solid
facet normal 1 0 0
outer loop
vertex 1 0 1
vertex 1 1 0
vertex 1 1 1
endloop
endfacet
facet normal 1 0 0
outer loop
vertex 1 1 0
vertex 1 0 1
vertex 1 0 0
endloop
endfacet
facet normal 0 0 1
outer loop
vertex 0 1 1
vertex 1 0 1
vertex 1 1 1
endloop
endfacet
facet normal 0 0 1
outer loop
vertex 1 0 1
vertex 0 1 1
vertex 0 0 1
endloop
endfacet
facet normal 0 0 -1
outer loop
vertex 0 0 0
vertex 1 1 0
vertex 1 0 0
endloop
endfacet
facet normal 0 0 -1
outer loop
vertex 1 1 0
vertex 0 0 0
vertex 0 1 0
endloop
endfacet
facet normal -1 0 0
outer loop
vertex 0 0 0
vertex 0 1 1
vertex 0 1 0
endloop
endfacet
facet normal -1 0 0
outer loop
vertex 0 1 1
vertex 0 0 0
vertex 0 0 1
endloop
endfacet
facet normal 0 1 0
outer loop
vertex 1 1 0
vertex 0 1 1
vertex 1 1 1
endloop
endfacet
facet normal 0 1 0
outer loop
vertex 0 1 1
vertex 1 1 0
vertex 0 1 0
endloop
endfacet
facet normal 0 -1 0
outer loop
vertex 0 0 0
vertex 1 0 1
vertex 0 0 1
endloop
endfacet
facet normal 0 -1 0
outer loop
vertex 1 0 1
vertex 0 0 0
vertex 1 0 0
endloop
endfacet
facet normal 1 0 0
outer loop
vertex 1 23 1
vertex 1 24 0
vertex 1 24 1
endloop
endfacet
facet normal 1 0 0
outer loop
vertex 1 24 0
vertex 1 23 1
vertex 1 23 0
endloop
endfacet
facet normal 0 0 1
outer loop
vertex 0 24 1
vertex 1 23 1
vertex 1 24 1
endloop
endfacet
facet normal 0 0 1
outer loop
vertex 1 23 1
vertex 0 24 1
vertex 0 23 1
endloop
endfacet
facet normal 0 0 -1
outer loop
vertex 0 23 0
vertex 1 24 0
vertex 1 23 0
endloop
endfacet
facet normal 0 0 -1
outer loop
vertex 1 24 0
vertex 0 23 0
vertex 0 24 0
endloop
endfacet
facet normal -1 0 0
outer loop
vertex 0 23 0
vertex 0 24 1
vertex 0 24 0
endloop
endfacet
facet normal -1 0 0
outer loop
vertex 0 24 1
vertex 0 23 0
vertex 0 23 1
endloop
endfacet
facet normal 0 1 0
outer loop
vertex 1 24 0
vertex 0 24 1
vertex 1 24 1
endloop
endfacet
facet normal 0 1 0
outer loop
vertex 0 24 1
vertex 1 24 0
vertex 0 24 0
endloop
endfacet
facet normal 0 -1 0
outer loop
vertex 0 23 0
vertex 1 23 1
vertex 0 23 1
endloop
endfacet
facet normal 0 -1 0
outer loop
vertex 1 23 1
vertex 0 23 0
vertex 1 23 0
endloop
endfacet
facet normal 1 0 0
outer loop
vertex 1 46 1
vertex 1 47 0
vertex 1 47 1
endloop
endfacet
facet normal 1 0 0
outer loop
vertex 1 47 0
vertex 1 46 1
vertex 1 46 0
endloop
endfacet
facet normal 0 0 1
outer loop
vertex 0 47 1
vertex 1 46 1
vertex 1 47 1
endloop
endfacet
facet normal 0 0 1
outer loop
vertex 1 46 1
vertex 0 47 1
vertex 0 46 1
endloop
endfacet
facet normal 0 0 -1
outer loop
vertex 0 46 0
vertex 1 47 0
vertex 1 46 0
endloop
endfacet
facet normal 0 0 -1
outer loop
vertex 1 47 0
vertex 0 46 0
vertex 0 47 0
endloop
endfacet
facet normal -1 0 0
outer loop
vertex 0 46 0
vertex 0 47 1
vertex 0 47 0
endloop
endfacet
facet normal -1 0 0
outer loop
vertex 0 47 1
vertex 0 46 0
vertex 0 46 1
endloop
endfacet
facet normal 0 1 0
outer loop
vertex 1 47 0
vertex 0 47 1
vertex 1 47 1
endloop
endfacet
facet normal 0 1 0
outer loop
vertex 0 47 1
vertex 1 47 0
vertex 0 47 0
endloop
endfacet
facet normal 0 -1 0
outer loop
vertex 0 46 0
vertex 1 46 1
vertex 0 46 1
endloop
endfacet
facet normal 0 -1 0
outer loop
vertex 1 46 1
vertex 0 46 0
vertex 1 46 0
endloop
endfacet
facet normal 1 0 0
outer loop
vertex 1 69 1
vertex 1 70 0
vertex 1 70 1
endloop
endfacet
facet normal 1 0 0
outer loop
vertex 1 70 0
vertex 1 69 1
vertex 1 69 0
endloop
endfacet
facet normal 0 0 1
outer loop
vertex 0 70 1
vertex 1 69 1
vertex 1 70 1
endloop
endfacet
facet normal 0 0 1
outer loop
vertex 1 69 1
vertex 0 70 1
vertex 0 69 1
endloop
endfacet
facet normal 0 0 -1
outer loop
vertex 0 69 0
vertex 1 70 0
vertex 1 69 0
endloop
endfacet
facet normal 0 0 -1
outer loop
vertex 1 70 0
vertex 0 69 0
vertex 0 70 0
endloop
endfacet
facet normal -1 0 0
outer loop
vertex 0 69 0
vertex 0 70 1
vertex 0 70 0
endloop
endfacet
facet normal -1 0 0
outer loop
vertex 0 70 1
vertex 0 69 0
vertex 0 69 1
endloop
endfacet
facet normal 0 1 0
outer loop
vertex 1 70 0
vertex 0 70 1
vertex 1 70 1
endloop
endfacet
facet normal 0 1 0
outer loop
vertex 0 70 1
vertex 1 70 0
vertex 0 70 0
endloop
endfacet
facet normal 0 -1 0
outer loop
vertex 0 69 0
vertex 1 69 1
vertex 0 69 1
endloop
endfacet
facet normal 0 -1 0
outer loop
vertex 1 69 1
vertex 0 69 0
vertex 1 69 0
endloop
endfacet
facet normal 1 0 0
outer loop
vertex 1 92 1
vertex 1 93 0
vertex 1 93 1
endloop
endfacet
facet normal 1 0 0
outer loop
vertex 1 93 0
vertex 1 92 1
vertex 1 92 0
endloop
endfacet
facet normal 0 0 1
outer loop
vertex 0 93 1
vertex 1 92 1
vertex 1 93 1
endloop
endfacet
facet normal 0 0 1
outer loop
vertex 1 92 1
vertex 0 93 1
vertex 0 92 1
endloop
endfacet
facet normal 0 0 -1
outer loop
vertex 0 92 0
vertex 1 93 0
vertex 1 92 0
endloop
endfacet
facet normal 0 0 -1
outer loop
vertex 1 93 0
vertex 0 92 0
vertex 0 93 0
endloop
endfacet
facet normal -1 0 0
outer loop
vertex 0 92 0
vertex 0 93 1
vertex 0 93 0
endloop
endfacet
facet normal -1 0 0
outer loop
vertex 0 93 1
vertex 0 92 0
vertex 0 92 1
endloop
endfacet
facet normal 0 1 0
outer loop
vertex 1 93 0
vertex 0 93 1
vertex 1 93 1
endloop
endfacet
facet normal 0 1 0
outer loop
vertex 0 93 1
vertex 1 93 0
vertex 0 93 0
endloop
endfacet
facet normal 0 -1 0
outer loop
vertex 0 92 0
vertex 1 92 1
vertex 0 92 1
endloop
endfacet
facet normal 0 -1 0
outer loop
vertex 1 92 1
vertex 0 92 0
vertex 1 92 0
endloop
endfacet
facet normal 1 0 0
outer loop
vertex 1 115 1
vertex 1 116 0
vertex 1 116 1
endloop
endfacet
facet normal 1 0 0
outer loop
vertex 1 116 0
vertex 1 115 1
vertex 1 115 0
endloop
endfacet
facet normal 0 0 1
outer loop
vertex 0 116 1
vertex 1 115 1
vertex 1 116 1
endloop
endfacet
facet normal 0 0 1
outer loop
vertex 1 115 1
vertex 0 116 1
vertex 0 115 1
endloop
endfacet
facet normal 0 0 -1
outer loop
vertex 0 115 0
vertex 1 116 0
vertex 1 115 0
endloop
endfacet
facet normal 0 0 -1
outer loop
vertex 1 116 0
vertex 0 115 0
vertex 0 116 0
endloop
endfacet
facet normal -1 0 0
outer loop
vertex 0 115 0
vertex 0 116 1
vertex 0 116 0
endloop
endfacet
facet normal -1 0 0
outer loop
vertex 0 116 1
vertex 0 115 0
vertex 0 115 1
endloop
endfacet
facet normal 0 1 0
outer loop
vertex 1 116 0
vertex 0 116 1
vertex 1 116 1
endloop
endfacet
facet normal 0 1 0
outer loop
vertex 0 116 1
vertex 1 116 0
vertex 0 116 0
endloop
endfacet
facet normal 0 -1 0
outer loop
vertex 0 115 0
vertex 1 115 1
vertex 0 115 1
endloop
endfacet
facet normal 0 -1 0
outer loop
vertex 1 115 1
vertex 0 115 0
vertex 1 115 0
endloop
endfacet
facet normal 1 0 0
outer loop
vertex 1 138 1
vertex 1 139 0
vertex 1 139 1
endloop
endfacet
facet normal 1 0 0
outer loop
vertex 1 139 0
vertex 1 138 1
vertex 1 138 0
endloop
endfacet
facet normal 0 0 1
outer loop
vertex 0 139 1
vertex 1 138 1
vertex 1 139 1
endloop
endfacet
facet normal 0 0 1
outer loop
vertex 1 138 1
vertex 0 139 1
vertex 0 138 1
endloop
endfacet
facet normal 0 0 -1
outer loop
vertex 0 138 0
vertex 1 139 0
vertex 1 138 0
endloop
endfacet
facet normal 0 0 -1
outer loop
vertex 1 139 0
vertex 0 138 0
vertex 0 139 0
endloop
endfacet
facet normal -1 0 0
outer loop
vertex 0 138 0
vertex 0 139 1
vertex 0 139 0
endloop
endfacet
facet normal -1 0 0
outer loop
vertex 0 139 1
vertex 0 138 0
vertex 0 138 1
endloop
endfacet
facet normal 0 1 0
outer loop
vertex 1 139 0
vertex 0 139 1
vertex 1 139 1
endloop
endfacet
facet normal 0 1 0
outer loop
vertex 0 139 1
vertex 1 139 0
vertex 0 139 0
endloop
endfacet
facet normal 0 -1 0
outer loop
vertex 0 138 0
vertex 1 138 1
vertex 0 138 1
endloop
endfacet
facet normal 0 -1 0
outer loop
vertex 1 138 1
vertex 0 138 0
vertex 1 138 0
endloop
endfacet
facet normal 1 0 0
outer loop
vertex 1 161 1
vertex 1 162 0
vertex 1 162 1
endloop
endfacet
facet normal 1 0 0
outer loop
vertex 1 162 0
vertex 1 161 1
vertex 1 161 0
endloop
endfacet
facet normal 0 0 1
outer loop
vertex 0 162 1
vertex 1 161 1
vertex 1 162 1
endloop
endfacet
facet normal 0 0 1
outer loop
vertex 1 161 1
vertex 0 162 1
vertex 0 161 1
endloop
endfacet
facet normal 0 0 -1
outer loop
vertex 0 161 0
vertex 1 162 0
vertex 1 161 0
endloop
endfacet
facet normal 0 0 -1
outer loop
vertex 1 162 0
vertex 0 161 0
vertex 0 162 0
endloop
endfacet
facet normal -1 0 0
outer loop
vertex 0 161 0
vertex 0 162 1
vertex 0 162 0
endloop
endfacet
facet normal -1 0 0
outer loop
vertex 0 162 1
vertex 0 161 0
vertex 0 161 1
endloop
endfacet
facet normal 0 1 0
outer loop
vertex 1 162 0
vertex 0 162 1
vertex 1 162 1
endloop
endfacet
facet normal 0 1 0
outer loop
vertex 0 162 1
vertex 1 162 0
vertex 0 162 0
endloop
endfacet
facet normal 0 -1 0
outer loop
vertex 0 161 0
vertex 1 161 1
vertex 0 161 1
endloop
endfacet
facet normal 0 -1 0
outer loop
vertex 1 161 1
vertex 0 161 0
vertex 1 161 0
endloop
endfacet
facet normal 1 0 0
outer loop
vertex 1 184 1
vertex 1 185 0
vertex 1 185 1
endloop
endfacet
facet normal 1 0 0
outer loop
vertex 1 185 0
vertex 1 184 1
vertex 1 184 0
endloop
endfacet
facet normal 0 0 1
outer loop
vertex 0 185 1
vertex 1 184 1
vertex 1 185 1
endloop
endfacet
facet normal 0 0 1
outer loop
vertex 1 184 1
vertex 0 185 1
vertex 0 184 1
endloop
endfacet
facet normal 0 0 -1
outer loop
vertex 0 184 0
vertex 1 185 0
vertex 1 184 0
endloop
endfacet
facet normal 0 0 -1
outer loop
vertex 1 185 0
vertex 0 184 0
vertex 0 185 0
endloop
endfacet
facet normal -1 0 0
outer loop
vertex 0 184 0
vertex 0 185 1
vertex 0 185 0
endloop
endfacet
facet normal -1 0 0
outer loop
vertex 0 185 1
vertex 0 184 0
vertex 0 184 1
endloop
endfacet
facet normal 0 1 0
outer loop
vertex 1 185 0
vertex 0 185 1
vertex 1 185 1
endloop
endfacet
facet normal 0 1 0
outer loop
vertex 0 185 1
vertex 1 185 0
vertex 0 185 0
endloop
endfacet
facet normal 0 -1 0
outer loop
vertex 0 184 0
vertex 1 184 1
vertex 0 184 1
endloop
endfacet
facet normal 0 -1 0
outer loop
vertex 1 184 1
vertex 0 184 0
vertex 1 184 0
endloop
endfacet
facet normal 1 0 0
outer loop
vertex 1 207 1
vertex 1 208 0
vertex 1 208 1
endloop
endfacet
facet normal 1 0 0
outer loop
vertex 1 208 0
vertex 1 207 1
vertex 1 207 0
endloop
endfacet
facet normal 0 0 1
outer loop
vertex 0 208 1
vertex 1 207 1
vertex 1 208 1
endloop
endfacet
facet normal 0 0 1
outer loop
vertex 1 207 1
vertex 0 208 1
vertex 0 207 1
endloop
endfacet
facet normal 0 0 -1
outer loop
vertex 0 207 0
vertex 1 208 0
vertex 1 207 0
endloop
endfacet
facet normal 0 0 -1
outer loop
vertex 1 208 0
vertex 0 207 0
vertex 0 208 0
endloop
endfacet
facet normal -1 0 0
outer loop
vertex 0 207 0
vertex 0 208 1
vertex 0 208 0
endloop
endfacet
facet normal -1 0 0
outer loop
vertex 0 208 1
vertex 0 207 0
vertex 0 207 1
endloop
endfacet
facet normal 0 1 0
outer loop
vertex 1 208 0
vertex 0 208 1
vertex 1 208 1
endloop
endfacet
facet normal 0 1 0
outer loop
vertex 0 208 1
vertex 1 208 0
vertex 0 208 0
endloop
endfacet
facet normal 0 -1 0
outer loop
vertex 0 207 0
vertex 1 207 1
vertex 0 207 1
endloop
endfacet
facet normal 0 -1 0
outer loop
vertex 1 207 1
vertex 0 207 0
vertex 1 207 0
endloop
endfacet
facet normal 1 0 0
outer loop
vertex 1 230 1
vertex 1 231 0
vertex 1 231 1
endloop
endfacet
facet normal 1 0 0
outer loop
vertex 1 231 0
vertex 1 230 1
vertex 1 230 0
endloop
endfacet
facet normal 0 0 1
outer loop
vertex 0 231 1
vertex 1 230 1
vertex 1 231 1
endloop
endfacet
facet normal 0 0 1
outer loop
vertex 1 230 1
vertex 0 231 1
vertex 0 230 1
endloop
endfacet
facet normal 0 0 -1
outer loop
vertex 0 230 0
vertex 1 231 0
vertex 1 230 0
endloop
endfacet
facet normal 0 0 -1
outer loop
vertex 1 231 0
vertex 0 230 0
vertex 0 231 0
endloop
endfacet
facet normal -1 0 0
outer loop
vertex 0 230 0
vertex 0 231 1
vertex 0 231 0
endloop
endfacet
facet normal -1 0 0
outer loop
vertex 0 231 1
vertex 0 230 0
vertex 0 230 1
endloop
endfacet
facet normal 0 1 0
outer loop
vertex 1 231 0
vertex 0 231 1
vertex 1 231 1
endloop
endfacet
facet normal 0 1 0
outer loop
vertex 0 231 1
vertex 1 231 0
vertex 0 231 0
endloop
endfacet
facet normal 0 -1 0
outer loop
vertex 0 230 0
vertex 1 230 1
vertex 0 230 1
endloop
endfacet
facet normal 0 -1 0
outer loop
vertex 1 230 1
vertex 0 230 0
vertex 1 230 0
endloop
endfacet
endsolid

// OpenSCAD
// file: ../lib_counter_trays.scad
/*
     Required parameters:
        toksize        width/height of token, in mm.  Counters must be square.
        tokthick       thickness of token, in mm.
        sections       list of how many counters should be in each section.
                       For example to have 3 sections with enough room for 
                       10, 7, and 4 counters of the size and thickness 
                       provided by the first 2 parameters, enter [10, 7, 4]

     Optional parameters: 
     Specify name=value separated by commas.  They can be listed in any order, 
     and are all optional, with default values.
         wallthick     Thickness of outer walls of the box.  Defaults to 1mm.
         intwallthick  Thickness of partitions between counters. If
                       not specified or set to zero, defaults to the same 
                       value as outer walls (1mm unless changed above).
         slack         Slop. Fiddle factor. Extra padding added to a few
                       places to account for some things not being physically
                       perfect. Defaults to 0.8mm.
         gap           How much room to leave between the boxes and the 
                       covers objects on the print plate.
         tolerance     How much extra space to leave between the box and
                       the cover to allow them to friction fit.  This is
                       probably what needs to most tuning between different
                       printers/etc.  Defaults to 0.1mm.  Adjust down if the
                       fit is too loose and the box keeps falling out. Adjust
                       up if the fit is too tight and the box doesn't fit.
         tokheight     If specified, makes a rectangular token, with this height.
                       Otherwise you get a toksize x toksize square.

     ArrangeCounterBox is a convenience module to arrange multiple boxes on
     the same print plate.  Usage is optional. It takes the token size as
     the only required argument. wallthick can also be provided as above.

 */

module HexBox(toksize, tokthick, sections, wallthick=1, slack=0.6, tolerance=0.1) {
    function sum1(list, i) = i >= 0 ? list[i] + sum1(list, i-1) : 0;
    function sum(list) = sum1(list, len(list)-1);

    ntok = sum(sections);
    nsec = len(sections);

    length = wallthick*2 + ntok*tokthick + nsec * slack + (nsec-2)*wallthick;
    offs = [ for (s = sections) s*tokthick + slack + wallthick ];

    r = (toksize/2)/tan(60);
    s = (toksize/2)/sin(60);

    // flat-top 
    // polygon([[0, 0], [r, -toksize/2], [r+s, -toksize/2], [2*r+s, 0], [r+s, toksize/2], [r, toksize/2]]);

    difference() {
        cube([2*wallthick + length, 2*wallthick + slack + toksize, r*2]);
        translate([wallthick, wallthick, r*2+wallthick]) {
            rotate([90, 0, 90]) {
                linear_extrude(length) {
                    polygon([[0, 0],
                            [0, -s/2],
                            [toksize/2+slack, -s/2-r],
                            [toksize+slack, -s/2],
                            [toksize+slack, 0]
                        ]);
                }
            }
        }
    }
    // sections
    translate([wallthick, wallthick, wallthick]) {
        for (i=[0:1:len(sections)-2]) {
            off=sum1(offs, i) - wallthick;

            translate([off, 0, 0]) {
                cube([wallthick, wallthick + toksize, r*2-wallthick]);
            }
        }
    }

    extraheadroom = 1;
    gap = 2;
    height = 4*r ;
    width = 2*wallthick + toksize + gap;

    // case
    caselen=length+2*wallthick;
    translate([- (height + 2*wallthick + tolerance + extraheadroom) - gap, 0, caselen]) {
        rotate([0, 90, 0]) {
            difference() {
                cube([caselen, width+wallthick*2, height+wallthick*2+extraheadroom]);
                translate([-1, wallthick-tolerance/2, wallthick-tolerance/2]) {
                    cube([caselen, width+tolerance, height+tolerance+extraheadroom]);
                }
                translate([caselen, (width+wallthick*2+tolerance)/2 , (height+wallthick*2+tolerance)/2]) {
                    cube([wallthick*2+1, width*(2/3), height*(2/3)], center=true);
                }
            }
        }
    }
}

module CounterBox(toksize, tokthick, sections, wallthick=1, intwallthick=0, slack=0.8, gap=10,  tolerance=0.1, tokheight=0, extraheadroom=1, skipcase=0, cards=0) {
    function sum1(list, i) = i >= 0 ? list[i] + sum1(list, i-1) : 0;
    function sum(list) = sum1(list, len(list)-1);
    theight = tokheight == 0 ? toksize : tokheight;
    docards = cards == 0 ? false : true;

    intwall = intwallthick ? intwallthick :  wallthick;

    offs = [ for (s = sections) s*tokthick + slack + intwall ];
    ntok = sum(sections);
    nsec = len(sections);

    length = wallthick*2 + ntok*tokthick + nsec * slack + (nsec-1)*intwall;
    width = wallthick*2 + toksize + slack;
    height = wallthick + theight + slack;
    partheight = wallthick + height * (2/3);


    // box
    difference() {
        holew=width*.6;
        cube([length, width, partheight]);
        translate([wallthick, wallthick, wallthick]) {
            cube([length-2*wallthick, width-2*wallthick, height]);
        }
        translate([wallthick, wallthick, wallthick]) {
            for (i=[0:1:len(sections)-2]) {
                off=sum1(offs, i) - wallthick;
                holel = offs[i+1] * .5;
                translate([off, 0, 0]) {
                    if (offs[i+1] > (height / 2)) {
                        translate([(offs[i+1])/2 - holel/2 + wallthick/2,width/2 - holew/2 - wallthick,-wallthick*2]) {
                            cube([holel, holew,wallthick*2+1]);
                        }
                    }
                }
            }
        }
    }

    // sections
    translate([wallthick, wallthick, wallthick]) {
        for (i=[0:1:len(sections)-2]) {
            off=sum1(offs, i) - wallthick;

            translate([off, 0, 0]) {
                difference() {
                    cube([intwall, width - 2 * wallthick, partheight - wallthick]);
                    if (cards) {
                        translate([-1, width / 2, partheight]) {
                            rotate([0, 90, 0]) {
                                linear_extrude(wallthick + 2) {
                                    circle(width / 3);
                                }
                            }
                        }
                    }
                }
            }
        }
    }
    if (skipcase == 0) {
        // case
        caselen=length+wallthick;
        translate([- (height + 2*wallthick + tolerance + extraheadroom) - gap, 0, caselen]) {
            rotate([0, 90, 0]) {
                difference() {
                    cube([caselen, width+wallthick*2, height+wallthick*2+extraheadroom]);
                    translate([-1, wallthick-tolerance/2, wallthick-tolerance/2]) {
                        cube([caselen, width+tolerance, height+tolerance+extraheadroom]);
                    }
                    translate([caselen, (width+wallthick*2+tolerance)/2 , (height+wallthick*2+tolerance)/2]) {
                        cube([wallthick*2+1, width*(2/3), height*(2/3)], center=true);
                    }
                }
            }
        }
    }
}

module ArrangeCounterBox(toksize, wallthick=1) {
    for (i=[0:$children-1]) {
        translate([0, i*(toksize+wallthick*4+5), 0]) {
            children(i);
        }
    }
}
// main file
include <../lib_counter_trays.scad>

ArrangeCounterBox(14) {
    // Conflicts
    CounterBox(15.5, 2, [
            5,  // [*] War
            6,  // [*] Conflict Type
            15, // [*] Conflict Status
            10, // [*] Relative Strength
            4,  // [*] WMD Acquired
            4,  // [*] Cyber Attack Used
            1,  // [*] Cyber vs Rogue State
            20, // [*] Opponents at war
            20, // [*] Allies at war (20?)
    ], "Conflicts");
    // US Forces
    CounterBox(15.5, 2, [
            6,  // [*] USAF
            6,  // [*] Carrier
            5,  // [*] Army Lt
            4,  // [*] Army Hv
            5,  // [*] Specops
            5,  // [*] Intel Advisor
            6,  // [*] USMC
            2,  // [*] Focused Intel
            16, // [*] Military Footprint
    ], "US Forces");
    // Opponents
    CounterBox(15.5, 2, [
            3,  // [*] DARPA
            7,  // [*] US Strategic Capabilities
            7,  // [*] China Strategic Capabilities
            7,  // [*] Russia Strategic Capabilities
            26, // [*] Opponent Influence
            4,  // [*] Bases
            4,  // [*] China Setup
            5,  // [*] China Random (2 +-AP, Acted, Summit used, Economic Trend) 
            4,  // [*] Russia Setup
            5,  // [*] Russia Random
            6,  // [*] Iran Influence
            2,  // [*] Iran/NK WMD/Missile Programs
            2,  // [*] Iran/NK Can't increase this turn
    ], "World Opponents");
    // World Status
    CounterBox(15.5, 2, [
            4,  // [*] Trade Agreements
            1,  // [*] Economic Trend
            4,  // [*] Ally Groups
            6,  // [*] Multilateral Sanctions
            4,  // [*] Unilateral Sanctions
            20, // [*] Civil War
            8,  // [*] Ceasefire
            1,  // [*] EU SOE
            8,  // [*] Regional Alignment
            8,  // [*] Regional Stability
            8,  // [*] Regional Crises
            8,  // [*] Pro/Anti US
            1,  // [*] EU SOE
    ], "International");
    CounterBox(15.5, 2, [
            8,  // [*] Bill Passed
            2,  // [*] Legislative Random (No New Legislation This Turn, Impeachment Proceedings) 
            16, // [*] Bills
            6,  // [*] Advances
            6,  // [*] Cabinet Priority
            1,  // [*] Bipartisan Cooperation
            1,  // [*] Party Relations
            2,  // [*] Cabinet Status (Cabinet Effectiveness, Effectiveness Trend)
            2,  // [*] Party Status (Control of Houses, Supreme Court Nominee)
            16, // [*] Public Priority
            16, // [*] Cabinet Priority
            1,  // [*] Campaign Promise
            5,  // [*] Scandals
    ], "Politics");
    CounterBox(15.5, 2, [
            1,  // [*] UN Speech
            6,  // [*] UN Sanctions
            12, // [*] UN Goodwill
            8,  // [*] UN Troops
    ], "UN");
    CounterBox(15.5, 2, [
            6,  // [*] Rogue State 1/2
            2,  // [*] Rogue State 3/4
            32, // [*] Terror Group 1/2
            8,  // [*] Terror Group 3/4
    ], "Enemies");
    CounterBox(15.5, 2, [
            24, // [*] Numbers
            10, // [*] +- AP
            6,  // [*] Game State (Public Approval, State of Economy, National Security, Media Relations, Relations w/Congress, World Opinion)
            1,  // [*] US Action
            1,  // [*] Current Turn
            1,  // [*] Nobel Prize
            5,  // [*] Legacy 1x, Legacy 10x, Prestige, AP+10, AP+20
    ], "Game State");
    CounterBox(15.5, 2, [
            3,  // [*] Must Choose Intel
            1,  // [*] No Joint Action
            1,  // [*] Intel Rolls -1 DRM
            9,  // [*] Ally relations
            2,  // [*] +2 DRM to Espionage
    ], "Allies");
    CounterBox(15.5, 2, [
            12, // [*] Legislative Friends
            12, // [*] Legislative Opponents
            1,  // [*] Economic Trend
            16, // [*] POTUS Attributes
            16, // [*] Cabinet Candidates
            2,  // [*] LDI, Domestic Crisis
    ], "Domestic");
    CounterBox(15.5, 2, [
            56,  // [*] Tensions
            24,  // [*] Crisis Chits
    ], "Tensions");
}
